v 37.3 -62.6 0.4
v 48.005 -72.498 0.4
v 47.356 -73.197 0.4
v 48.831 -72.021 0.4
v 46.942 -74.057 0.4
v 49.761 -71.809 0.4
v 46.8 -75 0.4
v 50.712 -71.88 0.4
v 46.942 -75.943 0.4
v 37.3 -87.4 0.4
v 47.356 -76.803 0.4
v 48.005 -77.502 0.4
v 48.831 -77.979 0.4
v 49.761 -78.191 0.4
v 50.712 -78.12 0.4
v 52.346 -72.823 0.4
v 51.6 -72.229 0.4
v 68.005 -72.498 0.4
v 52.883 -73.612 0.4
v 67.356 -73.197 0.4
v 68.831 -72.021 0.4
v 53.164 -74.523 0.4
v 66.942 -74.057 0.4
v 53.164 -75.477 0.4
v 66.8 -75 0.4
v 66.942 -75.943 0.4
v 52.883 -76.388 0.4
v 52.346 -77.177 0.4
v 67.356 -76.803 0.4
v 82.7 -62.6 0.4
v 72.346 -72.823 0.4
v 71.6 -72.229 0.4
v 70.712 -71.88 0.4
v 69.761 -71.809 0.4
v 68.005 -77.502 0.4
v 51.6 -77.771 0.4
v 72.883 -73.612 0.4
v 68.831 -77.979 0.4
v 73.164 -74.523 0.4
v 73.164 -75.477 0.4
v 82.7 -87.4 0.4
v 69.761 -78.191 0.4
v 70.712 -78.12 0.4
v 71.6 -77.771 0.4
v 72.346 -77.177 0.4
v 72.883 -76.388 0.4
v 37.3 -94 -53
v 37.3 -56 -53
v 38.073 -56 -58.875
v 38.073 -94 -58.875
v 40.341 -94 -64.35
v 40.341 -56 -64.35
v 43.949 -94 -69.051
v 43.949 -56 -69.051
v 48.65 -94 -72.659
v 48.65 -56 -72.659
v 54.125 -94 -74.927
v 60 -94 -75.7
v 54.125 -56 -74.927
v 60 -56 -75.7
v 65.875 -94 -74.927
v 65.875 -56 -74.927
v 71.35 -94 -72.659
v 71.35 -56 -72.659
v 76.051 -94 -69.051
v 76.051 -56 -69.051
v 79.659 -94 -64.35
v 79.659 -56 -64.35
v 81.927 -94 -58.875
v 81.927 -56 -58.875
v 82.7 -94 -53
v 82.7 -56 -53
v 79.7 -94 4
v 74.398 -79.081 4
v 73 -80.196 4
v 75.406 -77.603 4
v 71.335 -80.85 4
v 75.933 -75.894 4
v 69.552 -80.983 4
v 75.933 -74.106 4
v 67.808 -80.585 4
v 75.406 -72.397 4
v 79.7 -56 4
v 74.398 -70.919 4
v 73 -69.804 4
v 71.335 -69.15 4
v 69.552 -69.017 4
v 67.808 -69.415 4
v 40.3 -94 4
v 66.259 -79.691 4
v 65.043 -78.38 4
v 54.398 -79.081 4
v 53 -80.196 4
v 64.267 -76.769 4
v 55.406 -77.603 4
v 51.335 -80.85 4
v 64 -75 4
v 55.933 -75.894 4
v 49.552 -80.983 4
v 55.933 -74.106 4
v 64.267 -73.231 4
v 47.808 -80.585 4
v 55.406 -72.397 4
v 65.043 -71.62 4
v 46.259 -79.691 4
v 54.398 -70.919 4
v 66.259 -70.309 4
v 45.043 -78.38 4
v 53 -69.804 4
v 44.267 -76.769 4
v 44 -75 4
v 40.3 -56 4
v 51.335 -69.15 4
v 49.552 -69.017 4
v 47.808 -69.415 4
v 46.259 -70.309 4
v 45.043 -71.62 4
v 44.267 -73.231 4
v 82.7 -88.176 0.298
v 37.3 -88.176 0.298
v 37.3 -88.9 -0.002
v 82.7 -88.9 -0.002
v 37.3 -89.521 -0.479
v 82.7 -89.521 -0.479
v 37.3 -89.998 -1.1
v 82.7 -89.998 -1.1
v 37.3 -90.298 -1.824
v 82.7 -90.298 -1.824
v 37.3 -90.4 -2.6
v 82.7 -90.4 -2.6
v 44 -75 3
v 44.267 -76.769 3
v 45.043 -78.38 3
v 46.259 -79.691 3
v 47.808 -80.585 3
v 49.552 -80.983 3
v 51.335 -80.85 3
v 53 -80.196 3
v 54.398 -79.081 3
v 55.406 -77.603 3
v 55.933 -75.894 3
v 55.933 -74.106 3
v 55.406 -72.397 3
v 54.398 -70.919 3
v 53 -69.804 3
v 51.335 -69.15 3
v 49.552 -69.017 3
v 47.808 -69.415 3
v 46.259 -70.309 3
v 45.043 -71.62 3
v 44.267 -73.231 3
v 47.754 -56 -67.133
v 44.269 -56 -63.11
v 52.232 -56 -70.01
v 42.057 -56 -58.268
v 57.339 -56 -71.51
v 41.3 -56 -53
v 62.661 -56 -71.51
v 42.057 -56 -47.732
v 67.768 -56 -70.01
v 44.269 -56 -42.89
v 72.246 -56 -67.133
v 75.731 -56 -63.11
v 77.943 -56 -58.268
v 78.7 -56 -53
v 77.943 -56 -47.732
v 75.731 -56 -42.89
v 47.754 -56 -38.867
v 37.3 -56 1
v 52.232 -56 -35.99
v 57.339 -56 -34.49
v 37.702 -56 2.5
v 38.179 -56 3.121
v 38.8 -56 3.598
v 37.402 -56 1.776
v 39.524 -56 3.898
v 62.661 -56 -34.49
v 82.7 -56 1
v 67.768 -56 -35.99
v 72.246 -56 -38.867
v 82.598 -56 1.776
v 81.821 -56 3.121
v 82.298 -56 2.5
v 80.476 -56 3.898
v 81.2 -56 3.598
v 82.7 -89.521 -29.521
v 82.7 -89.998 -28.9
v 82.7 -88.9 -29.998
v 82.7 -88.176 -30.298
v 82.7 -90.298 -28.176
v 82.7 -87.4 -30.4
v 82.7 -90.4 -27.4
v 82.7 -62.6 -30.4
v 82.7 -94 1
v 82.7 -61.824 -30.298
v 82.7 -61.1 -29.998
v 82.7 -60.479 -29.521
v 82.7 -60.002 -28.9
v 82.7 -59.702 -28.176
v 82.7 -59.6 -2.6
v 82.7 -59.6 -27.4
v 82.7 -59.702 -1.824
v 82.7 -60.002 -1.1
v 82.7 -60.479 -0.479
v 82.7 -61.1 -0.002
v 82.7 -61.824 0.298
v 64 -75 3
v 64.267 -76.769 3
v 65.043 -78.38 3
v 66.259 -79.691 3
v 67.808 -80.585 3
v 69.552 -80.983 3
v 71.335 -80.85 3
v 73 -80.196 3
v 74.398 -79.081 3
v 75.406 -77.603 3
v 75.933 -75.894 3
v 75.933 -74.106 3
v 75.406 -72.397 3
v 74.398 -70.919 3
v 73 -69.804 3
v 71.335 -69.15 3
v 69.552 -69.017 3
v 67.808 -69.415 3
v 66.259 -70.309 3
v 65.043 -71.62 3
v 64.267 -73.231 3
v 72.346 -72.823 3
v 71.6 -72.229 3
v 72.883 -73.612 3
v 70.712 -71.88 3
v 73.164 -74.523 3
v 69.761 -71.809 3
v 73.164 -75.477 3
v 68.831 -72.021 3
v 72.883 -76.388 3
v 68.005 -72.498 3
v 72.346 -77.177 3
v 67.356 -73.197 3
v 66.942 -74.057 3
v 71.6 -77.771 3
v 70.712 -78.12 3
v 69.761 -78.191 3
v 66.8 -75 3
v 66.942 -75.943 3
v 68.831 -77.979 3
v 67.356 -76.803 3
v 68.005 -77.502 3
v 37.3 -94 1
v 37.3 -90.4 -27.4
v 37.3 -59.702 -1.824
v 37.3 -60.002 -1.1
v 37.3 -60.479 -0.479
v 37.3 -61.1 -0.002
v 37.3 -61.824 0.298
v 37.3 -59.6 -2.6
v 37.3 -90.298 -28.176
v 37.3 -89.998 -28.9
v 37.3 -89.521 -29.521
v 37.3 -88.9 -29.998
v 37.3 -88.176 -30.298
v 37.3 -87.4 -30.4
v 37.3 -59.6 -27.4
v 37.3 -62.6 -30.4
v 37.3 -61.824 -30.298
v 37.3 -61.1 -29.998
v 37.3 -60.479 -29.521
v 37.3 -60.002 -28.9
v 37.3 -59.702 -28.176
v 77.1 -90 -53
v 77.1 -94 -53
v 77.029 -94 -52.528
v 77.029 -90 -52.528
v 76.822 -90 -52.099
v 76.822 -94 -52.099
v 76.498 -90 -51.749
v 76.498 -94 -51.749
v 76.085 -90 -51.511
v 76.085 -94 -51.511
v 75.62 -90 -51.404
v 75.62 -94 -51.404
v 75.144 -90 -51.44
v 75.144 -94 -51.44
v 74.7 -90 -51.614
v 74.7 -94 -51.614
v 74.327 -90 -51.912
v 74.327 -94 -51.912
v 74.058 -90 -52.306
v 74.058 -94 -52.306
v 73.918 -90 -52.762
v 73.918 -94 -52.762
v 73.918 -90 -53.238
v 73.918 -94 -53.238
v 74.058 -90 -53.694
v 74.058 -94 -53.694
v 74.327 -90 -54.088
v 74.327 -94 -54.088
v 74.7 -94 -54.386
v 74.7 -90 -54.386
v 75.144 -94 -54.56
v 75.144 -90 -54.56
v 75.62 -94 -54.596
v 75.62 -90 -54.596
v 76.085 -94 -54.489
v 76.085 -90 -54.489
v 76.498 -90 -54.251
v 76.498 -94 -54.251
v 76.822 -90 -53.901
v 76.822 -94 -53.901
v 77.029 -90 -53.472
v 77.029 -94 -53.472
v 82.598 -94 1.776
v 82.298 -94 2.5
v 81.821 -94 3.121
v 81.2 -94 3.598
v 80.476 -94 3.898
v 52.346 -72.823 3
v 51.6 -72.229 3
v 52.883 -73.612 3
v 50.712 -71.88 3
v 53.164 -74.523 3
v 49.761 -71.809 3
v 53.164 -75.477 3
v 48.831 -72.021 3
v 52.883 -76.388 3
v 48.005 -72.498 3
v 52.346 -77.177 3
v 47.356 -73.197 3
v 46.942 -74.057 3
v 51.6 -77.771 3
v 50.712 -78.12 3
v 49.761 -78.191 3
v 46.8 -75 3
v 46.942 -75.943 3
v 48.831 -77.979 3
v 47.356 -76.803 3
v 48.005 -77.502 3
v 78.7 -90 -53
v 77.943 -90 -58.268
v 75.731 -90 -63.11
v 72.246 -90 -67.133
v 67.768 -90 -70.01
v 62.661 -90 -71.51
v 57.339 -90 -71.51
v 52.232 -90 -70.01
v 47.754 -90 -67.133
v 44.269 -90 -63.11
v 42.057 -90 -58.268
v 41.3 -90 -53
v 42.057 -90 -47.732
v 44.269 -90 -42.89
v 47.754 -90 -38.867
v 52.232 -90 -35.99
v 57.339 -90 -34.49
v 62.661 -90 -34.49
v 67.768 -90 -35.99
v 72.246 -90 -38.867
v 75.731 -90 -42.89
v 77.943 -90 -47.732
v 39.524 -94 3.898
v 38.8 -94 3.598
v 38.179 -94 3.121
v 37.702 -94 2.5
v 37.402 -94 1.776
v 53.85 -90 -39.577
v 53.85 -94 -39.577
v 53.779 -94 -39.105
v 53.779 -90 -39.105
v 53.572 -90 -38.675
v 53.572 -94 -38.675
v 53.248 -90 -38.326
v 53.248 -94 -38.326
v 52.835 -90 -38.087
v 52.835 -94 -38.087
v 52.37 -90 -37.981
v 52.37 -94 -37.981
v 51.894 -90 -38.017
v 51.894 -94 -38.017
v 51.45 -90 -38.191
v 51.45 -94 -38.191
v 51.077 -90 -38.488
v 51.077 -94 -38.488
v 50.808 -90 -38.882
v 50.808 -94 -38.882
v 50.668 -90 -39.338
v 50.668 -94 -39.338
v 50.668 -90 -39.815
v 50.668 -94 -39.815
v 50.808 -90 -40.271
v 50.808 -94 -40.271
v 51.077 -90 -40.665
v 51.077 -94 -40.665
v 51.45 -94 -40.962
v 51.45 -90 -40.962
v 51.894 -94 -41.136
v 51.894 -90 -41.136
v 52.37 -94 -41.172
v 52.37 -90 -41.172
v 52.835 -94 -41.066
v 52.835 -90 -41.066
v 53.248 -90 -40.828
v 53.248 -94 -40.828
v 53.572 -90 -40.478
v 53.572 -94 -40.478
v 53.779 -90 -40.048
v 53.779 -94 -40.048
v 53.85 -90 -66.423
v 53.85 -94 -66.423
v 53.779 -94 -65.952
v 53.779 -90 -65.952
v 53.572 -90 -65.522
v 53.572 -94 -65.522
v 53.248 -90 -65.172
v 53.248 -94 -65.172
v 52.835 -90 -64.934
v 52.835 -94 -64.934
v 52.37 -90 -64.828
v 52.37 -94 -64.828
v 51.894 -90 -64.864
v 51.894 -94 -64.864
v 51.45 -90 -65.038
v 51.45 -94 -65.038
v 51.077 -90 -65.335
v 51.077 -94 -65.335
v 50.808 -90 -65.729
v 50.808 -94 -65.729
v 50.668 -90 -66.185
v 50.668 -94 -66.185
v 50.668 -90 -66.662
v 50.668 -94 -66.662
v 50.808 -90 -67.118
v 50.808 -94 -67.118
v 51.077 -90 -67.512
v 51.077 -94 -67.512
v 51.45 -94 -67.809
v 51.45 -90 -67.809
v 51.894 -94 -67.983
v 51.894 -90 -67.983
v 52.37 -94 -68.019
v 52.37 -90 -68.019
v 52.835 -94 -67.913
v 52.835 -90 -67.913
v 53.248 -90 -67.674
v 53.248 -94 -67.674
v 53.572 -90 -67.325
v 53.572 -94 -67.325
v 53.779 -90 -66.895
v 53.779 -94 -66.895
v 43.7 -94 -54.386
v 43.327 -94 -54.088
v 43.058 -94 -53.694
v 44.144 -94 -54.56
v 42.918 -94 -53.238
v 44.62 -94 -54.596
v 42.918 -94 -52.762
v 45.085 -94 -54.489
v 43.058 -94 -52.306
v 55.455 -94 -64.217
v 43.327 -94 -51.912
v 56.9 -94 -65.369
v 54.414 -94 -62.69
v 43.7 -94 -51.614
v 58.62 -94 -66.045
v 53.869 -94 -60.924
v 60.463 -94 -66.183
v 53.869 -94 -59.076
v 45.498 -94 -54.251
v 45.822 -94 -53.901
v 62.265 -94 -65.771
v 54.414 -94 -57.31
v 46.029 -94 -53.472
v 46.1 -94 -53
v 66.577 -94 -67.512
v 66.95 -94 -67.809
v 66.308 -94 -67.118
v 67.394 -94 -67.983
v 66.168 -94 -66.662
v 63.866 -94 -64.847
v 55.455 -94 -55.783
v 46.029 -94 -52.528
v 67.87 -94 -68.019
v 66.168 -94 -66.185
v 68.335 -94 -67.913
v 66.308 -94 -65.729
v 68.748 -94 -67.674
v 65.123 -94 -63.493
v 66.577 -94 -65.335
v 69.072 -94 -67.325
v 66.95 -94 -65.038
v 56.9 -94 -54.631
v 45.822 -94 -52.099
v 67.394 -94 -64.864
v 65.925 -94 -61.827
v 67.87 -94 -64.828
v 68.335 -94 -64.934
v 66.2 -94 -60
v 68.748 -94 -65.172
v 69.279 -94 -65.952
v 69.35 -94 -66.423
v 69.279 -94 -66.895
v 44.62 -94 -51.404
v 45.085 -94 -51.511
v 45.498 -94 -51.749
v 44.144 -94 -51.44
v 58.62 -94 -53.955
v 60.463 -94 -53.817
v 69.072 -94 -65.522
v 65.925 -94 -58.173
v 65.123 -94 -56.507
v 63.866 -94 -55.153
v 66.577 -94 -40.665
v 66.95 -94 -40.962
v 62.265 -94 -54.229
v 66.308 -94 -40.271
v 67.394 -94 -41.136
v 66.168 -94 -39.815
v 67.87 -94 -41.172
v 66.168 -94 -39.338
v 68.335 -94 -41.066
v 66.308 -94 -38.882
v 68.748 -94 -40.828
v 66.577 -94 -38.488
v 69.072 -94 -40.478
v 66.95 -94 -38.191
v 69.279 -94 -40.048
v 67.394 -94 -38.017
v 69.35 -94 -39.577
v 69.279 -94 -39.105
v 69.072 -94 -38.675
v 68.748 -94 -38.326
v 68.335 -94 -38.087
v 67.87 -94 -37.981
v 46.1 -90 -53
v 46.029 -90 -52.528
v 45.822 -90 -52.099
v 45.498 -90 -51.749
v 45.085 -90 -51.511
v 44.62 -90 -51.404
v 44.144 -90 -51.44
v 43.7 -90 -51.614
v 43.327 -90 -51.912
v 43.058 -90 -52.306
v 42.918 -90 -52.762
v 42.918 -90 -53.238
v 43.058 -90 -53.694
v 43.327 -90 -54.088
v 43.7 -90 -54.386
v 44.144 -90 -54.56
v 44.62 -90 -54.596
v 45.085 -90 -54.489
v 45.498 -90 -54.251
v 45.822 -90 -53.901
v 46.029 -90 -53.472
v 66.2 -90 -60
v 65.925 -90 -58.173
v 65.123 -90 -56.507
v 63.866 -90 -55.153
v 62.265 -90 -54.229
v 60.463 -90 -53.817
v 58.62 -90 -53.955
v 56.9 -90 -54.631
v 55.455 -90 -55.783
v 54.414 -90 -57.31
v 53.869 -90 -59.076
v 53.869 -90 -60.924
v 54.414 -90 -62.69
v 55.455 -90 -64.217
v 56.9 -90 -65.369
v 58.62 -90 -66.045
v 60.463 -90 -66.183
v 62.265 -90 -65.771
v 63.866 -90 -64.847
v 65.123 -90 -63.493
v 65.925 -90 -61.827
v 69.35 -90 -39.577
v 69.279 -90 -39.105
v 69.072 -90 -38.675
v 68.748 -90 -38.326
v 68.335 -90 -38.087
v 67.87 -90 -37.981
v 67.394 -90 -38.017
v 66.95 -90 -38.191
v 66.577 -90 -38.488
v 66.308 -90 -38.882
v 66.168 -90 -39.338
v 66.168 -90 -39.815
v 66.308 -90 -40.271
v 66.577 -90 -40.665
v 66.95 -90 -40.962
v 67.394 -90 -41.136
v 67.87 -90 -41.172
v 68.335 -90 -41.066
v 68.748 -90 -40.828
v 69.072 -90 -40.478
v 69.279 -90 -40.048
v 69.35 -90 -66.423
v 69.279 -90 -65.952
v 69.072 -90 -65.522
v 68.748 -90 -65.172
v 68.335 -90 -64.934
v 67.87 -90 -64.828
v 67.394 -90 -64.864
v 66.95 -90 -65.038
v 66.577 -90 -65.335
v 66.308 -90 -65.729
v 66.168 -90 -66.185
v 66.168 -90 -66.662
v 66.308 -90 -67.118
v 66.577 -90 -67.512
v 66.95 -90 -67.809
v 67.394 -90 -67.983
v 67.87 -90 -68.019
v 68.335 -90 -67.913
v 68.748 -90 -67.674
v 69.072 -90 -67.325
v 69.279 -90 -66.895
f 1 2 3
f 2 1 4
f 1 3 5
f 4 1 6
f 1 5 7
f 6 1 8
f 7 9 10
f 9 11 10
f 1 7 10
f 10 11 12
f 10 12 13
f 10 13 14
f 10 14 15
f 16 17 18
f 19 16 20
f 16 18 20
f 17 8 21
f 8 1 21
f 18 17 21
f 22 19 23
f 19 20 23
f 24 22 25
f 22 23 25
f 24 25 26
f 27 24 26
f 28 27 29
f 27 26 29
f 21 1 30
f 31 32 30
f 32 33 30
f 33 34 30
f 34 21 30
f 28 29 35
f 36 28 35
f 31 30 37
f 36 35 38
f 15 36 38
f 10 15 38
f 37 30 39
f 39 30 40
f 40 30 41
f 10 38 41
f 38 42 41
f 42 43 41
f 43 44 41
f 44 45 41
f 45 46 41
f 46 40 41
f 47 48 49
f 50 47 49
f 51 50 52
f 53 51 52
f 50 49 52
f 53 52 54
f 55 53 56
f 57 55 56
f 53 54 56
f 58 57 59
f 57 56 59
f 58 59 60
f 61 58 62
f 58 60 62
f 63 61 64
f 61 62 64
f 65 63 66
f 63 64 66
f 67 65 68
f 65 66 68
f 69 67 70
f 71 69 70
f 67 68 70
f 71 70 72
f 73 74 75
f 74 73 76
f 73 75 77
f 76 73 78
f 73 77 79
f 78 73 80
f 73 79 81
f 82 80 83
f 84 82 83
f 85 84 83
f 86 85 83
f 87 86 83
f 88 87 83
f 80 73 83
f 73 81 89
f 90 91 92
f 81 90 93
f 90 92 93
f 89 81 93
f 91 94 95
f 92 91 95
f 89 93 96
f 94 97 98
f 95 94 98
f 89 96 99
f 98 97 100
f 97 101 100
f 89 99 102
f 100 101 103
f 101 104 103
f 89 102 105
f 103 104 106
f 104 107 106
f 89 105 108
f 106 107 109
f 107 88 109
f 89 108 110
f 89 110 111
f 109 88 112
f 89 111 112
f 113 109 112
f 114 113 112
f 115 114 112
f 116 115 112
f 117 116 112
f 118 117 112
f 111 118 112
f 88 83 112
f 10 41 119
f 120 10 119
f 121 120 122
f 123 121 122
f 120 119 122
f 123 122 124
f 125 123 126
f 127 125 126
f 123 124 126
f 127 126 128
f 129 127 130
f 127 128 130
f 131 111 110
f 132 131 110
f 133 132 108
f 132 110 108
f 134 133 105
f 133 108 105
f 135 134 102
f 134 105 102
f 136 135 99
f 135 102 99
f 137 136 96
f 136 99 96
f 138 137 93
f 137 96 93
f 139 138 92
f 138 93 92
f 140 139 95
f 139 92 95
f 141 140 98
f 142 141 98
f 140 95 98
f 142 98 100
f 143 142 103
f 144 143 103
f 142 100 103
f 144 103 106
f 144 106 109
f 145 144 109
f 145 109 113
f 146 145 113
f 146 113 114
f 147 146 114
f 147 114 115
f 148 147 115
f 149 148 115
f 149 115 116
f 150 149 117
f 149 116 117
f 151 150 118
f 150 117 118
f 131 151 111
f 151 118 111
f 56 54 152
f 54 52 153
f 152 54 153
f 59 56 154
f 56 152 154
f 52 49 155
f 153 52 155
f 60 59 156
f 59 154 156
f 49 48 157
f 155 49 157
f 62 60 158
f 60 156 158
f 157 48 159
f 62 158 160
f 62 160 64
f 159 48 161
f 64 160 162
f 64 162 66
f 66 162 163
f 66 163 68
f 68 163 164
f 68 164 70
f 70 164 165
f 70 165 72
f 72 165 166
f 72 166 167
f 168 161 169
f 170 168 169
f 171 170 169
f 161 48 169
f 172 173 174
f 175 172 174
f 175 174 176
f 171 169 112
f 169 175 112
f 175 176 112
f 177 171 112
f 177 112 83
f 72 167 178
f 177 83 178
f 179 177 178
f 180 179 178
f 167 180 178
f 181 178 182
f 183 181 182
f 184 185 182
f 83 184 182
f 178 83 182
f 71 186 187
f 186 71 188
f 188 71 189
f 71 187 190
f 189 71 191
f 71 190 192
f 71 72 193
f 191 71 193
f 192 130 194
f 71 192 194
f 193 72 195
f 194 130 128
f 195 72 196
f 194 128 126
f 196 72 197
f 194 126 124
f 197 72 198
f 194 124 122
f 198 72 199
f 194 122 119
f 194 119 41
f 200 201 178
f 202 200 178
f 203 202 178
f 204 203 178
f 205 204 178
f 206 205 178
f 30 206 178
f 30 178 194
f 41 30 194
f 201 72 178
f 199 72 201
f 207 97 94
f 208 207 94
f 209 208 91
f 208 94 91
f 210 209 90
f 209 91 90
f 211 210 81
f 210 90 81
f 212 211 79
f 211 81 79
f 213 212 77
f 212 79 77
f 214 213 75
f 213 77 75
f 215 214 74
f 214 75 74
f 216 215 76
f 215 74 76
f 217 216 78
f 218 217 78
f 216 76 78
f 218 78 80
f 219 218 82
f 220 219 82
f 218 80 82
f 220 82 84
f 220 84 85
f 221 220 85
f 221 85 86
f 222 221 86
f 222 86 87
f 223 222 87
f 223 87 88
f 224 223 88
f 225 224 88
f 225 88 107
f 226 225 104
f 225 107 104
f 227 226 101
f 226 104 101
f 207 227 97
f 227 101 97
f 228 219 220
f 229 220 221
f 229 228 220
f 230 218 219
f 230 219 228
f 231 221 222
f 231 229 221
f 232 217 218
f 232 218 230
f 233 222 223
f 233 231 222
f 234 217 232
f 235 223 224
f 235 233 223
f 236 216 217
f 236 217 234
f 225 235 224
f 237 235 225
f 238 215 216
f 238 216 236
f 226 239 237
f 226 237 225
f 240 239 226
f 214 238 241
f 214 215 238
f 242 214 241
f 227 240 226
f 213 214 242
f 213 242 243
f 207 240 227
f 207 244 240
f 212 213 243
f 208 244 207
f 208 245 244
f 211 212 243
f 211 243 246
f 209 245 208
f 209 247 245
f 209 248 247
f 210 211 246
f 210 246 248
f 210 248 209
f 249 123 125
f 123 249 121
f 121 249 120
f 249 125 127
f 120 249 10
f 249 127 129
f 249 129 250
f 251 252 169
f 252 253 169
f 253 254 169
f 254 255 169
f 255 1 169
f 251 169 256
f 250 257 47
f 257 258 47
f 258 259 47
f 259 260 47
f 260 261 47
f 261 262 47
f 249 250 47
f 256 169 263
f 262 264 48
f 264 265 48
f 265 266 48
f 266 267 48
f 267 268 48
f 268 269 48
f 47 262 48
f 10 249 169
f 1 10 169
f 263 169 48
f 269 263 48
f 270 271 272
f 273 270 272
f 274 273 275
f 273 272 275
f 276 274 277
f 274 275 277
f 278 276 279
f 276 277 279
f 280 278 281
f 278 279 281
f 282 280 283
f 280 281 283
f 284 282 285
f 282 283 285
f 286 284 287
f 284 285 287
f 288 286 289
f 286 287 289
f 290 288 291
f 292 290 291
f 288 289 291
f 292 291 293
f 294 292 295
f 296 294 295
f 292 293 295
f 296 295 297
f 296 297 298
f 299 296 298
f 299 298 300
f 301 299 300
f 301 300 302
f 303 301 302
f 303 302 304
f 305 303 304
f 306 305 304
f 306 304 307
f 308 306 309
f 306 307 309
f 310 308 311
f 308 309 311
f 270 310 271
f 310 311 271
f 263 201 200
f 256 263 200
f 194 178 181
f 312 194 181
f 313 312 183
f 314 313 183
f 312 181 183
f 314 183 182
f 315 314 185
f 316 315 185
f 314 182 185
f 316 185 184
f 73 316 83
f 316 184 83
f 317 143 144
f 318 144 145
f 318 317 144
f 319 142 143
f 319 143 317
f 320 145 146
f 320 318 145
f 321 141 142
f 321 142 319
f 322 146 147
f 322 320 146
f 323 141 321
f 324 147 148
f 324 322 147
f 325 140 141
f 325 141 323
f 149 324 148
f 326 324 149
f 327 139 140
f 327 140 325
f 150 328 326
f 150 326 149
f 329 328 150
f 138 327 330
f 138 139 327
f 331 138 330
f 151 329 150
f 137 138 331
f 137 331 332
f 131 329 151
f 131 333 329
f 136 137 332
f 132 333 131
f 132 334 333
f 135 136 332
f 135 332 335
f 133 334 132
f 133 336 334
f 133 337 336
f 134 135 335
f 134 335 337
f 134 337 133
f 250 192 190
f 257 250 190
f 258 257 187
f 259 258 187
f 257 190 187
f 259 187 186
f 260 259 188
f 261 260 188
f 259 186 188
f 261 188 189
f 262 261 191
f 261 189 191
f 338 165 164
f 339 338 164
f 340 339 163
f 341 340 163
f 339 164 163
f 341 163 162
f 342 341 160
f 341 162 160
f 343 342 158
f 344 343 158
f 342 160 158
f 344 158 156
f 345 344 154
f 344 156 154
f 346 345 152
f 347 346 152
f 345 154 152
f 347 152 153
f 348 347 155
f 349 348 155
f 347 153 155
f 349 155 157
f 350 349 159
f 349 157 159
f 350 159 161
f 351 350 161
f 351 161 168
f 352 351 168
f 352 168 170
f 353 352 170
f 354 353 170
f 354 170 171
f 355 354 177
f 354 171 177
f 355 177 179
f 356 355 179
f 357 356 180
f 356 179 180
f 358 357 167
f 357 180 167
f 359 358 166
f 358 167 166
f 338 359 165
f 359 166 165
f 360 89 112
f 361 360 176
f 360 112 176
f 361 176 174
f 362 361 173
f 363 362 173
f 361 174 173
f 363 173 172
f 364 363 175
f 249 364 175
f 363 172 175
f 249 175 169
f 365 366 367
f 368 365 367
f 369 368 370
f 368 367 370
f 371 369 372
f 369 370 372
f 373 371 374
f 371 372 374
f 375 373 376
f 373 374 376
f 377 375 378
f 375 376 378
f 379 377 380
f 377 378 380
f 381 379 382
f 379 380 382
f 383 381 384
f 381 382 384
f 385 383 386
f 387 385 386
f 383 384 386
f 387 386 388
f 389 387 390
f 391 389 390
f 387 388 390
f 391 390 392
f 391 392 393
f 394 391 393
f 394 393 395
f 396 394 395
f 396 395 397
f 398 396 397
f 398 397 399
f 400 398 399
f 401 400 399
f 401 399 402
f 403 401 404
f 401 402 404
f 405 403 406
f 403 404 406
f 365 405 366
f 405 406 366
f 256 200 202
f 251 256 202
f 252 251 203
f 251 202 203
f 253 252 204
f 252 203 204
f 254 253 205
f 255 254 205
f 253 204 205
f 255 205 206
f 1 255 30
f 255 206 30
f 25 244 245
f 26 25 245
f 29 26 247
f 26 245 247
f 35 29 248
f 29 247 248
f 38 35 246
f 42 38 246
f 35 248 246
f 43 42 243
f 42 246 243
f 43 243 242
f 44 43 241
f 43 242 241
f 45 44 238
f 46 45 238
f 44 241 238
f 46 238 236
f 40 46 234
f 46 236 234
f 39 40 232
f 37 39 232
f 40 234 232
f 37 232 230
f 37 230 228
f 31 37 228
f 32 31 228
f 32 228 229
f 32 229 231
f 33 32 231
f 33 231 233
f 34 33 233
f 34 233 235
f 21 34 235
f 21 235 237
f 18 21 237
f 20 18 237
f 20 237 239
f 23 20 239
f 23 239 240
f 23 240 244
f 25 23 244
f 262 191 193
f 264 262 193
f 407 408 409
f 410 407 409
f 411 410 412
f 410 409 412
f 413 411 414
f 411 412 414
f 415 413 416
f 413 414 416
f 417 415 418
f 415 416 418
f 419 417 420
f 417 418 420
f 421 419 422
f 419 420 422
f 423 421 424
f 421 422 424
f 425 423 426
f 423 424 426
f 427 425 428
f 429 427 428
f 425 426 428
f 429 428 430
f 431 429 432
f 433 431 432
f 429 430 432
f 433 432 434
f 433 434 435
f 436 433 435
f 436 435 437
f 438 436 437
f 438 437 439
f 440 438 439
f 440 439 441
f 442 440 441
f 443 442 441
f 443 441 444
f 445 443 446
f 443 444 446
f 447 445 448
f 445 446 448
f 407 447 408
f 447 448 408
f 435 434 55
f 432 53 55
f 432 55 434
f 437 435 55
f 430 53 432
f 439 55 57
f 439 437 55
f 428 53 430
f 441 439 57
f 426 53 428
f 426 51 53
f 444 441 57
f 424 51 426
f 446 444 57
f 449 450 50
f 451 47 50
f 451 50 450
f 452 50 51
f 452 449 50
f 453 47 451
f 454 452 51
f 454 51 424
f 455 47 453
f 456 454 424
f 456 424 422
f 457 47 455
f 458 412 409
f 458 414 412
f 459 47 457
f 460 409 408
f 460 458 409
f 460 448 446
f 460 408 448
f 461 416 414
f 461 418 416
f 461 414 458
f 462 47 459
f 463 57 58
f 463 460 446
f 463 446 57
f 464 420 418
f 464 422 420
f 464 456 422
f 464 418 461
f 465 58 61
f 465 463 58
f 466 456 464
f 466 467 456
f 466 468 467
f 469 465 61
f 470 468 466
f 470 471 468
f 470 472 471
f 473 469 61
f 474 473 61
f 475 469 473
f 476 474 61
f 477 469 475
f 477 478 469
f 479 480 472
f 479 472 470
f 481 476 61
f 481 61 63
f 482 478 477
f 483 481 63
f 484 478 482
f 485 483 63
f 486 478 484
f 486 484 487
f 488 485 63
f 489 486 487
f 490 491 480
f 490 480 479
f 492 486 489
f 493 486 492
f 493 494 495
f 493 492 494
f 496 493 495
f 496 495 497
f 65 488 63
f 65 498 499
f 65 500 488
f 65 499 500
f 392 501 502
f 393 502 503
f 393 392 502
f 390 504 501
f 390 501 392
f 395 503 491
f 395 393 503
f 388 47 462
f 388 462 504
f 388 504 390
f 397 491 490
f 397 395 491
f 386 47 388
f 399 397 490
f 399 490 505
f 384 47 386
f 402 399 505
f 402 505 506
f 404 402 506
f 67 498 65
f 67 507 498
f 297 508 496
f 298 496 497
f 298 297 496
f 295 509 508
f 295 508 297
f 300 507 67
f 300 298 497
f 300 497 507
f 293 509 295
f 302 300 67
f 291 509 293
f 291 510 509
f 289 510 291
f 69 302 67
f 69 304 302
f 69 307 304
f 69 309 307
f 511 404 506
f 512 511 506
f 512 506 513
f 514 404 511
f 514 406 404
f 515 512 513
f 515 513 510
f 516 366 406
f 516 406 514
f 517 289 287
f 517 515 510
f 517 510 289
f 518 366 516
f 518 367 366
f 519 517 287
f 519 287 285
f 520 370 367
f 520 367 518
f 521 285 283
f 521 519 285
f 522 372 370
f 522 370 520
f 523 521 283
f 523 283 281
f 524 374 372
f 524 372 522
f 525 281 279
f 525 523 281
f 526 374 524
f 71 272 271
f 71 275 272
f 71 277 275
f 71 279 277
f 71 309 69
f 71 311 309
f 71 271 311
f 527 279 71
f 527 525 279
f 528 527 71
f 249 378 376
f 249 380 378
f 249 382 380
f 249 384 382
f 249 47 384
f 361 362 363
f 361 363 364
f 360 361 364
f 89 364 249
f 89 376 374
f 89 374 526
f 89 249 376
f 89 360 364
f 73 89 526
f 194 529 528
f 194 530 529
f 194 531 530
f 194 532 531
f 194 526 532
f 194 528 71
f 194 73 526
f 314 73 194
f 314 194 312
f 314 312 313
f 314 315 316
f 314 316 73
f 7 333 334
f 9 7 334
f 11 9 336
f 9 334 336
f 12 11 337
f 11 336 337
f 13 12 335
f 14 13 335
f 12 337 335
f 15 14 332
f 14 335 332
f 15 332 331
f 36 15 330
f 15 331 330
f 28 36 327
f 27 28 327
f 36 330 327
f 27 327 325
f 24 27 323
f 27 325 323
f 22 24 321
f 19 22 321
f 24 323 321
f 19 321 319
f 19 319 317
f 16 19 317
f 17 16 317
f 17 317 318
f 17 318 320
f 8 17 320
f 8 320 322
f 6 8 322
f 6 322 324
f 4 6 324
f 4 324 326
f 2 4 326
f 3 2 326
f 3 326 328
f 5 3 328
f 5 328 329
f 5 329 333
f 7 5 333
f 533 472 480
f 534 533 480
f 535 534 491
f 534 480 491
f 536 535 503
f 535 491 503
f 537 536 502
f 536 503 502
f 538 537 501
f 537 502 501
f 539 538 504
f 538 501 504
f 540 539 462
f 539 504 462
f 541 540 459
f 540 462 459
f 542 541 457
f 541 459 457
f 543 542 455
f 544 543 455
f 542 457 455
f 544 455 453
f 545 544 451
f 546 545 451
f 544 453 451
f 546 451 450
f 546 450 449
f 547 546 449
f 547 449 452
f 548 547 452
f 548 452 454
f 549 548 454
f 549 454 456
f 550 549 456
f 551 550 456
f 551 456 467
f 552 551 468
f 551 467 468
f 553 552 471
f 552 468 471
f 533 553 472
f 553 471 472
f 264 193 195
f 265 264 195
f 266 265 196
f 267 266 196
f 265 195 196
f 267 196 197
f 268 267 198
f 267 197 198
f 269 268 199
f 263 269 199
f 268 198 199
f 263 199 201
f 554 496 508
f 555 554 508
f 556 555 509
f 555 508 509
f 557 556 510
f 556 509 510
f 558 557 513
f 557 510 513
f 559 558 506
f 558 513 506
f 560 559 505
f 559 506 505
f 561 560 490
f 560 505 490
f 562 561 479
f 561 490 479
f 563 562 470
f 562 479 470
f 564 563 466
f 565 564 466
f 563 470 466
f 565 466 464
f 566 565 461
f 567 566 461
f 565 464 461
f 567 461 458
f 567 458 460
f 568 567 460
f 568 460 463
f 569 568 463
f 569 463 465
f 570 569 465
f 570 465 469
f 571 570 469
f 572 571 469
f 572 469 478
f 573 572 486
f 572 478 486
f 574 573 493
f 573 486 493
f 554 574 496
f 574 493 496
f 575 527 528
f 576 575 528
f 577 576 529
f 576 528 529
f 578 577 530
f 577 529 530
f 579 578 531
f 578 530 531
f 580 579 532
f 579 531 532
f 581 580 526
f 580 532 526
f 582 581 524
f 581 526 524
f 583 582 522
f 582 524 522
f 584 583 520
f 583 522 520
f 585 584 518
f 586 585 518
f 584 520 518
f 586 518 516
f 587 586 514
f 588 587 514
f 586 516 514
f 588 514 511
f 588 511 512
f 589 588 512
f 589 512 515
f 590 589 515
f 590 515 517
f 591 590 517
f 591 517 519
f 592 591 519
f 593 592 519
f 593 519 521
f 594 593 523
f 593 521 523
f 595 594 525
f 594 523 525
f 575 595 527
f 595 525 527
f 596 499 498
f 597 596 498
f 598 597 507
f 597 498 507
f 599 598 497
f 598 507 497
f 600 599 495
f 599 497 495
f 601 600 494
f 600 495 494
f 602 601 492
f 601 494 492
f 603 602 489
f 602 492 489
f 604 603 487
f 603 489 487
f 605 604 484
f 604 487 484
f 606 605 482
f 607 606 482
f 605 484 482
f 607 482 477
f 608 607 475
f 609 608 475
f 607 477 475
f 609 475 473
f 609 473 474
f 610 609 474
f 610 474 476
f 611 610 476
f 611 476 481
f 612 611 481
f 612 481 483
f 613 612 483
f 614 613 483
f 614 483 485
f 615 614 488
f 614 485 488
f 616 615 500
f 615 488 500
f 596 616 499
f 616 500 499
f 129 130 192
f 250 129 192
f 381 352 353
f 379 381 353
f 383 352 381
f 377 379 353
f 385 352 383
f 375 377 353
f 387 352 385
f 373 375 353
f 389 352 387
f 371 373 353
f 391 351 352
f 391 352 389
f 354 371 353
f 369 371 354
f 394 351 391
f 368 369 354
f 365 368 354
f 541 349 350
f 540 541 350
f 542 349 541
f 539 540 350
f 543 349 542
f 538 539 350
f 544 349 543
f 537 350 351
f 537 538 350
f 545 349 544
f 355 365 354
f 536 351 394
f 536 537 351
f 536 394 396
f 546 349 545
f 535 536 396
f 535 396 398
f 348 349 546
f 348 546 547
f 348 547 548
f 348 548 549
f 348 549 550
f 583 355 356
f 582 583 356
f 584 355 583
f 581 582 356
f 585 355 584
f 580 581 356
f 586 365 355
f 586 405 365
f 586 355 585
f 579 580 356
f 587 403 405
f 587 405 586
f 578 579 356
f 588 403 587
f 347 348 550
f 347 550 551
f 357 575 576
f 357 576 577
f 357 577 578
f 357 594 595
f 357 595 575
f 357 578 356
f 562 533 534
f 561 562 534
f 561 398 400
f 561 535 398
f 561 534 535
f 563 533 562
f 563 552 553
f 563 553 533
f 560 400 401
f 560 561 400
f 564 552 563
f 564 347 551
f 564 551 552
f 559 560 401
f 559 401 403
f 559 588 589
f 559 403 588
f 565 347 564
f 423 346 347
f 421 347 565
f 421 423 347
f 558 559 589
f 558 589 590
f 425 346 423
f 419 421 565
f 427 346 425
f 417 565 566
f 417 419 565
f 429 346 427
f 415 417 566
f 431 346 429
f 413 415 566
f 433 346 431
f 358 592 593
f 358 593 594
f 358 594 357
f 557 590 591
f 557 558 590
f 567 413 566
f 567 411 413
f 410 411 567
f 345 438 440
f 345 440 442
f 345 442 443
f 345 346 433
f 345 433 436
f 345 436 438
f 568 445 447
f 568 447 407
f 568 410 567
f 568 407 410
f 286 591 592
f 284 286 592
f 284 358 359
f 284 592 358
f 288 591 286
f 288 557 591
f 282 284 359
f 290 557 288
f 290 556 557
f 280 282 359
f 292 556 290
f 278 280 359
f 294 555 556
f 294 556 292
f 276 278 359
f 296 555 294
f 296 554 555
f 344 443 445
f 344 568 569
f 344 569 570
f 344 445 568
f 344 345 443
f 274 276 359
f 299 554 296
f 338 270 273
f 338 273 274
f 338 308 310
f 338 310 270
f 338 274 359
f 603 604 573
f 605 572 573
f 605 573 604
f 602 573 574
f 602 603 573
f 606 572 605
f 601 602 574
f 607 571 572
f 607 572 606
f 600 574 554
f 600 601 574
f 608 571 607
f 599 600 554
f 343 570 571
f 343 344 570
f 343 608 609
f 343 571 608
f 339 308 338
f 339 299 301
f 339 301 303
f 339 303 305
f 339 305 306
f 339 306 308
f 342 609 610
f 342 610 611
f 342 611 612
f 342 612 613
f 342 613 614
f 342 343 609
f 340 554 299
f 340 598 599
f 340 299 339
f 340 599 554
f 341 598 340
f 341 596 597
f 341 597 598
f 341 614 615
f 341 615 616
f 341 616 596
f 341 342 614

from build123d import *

# Parameters (mm, degrees)
PAD_START       = 56
PAD_DEPTH       = 38
SKETCH001_R     = 18.7
POCKET_DEPTH    = 34
SKETCH002_R     = 6.2
SKETCH002_R_2   = 1.6
POCKET001_DEPTH = 4
POCKET002_DEPTH = 45.401
SKETCH004_R     = 3.2
POCKET003_DEPTH = 3.6
SKETCH005_R     = 6
POCKET004_DEPTH = 1


with BuildPart() as part:
    # Sketch → Pad (new body)
    with BuildSketch(Plane.XZ.offset(PAD_START)):
        with BuildLine():
            Line((37.3, 1), (37.3, -53))
            ThreePointArc((37.3, -53), (60, -75.7), (82.7, -53))
            Line((82.7, -53), (82.7, 1))
            ThreePointArc((82.7, 1), (81.82132, 3.12132), (79.7, 4))
            Line((79.7, 4), (40.3, 4))
            ThreePointArc((40.3, 4), (38.17868, 3.12132), (37.3, 1))
        make_face()
    extrude(amount=PAD_DEPTH)

    # Sketch001 (on Face7 of Pad) → Pocket (cut)
    with BuildSketch(Plane(origin=(0, -56, 0), x_dir=(1, 0, 0), z_dir=(0, 1, 0))):
        with Locations((60, 53)):
            Circle(SKETCH001_R)
    extrude(amount=-POCKET_DEPTH, mode=Mode.SUBTRACT)

    # Sketch002 (on Face5 of Pocket) → Pocket001 (cut)
    with BuildSketch(Plane.XZ.offset(94)):
        with Locations((60, -60)):
            Circle(SKETCH002_R)
        with Locations((52.25, -39.576606)):
            Circle(SKETCH002_R_2)
        with Locations((67.75, -39.576606)):
            Circle(SKETCH002_R_2)
        with Locations((75.5, -53)):
            Circle(SKETCH002_R_2)
        with Locations((67.75, -66.423394)):
            Circle(SKETCH002_R_2)
        with Locations((52.25, -66.423394)):
            Circle(SKETCH002_R_2)
        with Locations((44.5, -53)):
            Circle(SKETCH002_R_2)
    extrude(amount=-POCKET001_DEPTH, mode=Mode.SUBTRACT)

    # Sketch003 (on Face7 of Pocket001) → Pocket002 (cut, through all)
    with BuildSketch(Plane(origin=(82.7, 0, 0), x_dir=(0, 0, 1), z_dir=(1, 0, 0))):
        with BuildLine():
            Line((-30.4, 87.4), (-30.4, 62.6))
            ThreePointArc((-30.4, 62.6), (-29.52132, 60.47868), (-27.4, 59.6))
            Line((-27.4, 59.6), (-2.6, 59.6))
            ThreePointArc((-2.6, 59.6), (-0.47868, 60.47868), (0.4, 62.6))
            Line((0.4, 62.6), (0.4, 87.4))
            ThreePointArc((0.4, 87.4), (-0.47868, 89.52132), (-2.6, 90.4))
            Line((-2.6, 90.4), (-27.4, 90.4))
            ThreePointArc((-27.4, 90.4), (-29.52132, 89.52132), (-30.4, 87.4))
        make_face()
    extrude(amount=-POCKET002_DEPTH, mode=Mode.SUBTRACT)

    # Sketch004 (on Face14 of Pocket002) → Pocket003 (cut)
    with BuildSketch(Plane(origin=(0, 0, 4), x_dir=(-1, 0, 0), z_dir=(0, 0, 1))):
        with Locations((-70, 75)):
            Circle(SKETCH004_R)
        with Locations((-50, 75)):
            Circle(SKETCH004_R)
    extrude(amount=-POCKET003_DEPTH, mode=Mode.SUBTRACT)

    # Sketch005 (on Face14 of Pocket003) → Pocket004 (cut)
    with BuildSketch(Plane(origin=(0, 0, 4), x_dir=(-1, 0, 0), z_dir=(0, 0, 1))):
        with Locations((-70, 75)):
            Circle(SKETCH005_R)
        with Locations((-50, 75)):
            Circle(SKETCH005_R)
    extrude(amount=-POCKET004_DEPTH, mode=Mode.SUBTRACT)


solid = part.part
